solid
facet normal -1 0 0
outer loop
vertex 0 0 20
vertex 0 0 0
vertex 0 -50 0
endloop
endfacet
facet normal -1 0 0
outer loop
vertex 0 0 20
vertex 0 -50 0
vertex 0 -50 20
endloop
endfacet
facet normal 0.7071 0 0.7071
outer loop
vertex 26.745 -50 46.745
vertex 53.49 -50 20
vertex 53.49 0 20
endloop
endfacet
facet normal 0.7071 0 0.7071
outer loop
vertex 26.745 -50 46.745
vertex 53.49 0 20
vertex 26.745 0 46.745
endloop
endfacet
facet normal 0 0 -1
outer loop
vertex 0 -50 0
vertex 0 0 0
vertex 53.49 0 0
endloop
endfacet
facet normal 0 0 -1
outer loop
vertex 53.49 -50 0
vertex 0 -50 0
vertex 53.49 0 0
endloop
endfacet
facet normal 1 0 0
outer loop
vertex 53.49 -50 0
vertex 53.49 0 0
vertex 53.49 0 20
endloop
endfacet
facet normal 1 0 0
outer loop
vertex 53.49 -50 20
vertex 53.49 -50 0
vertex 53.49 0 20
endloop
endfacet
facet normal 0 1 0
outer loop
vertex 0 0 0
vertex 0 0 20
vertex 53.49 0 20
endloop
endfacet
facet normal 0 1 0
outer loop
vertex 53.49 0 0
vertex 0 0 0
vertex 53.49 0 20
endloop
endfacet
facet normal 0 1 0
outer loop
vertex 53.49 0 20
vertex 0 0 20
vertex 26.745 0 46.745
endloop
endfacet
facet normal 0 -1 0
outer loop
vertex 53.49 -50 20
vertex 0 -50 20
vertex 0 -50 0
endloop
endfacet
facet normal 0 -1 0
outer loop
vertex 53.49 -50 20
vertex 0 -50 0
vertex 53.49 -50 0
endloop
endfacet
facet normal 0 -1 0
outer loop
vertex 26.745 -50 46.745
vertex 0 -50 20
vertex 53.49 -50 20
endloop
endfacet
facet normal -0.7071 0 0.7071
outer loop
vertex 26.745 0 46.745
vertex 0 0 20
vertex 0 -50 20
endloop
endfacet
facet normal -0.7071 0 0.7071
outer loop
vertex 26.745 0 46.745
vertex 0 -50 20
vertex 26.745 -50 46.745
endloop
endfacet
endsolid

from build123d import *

# Parameters (mm, degrees)
F0_W        = 53.4896697645
F0_H        = 50
F1_DEPTH    = 50
F2_T1_DEPTH = 204.300979278


# Not quite as in the source:
# - a fillet or chamfer that OpenCascade refuses, or shapes differently, is made with other operations: its cross-section is extruded or revolved along the edge and cut away or added


with BuildPart() as f1:
    # F0 (on Front) → F1 (new body)
    with BuildSketch(Plane.XZ):
        with Locations((26.7448348823, 25)):
            Rectangle(F0_W, F0_H)
    extrude(amount=F1_DEPTH)

    # F2: chamfer of 30 on 2 edges, made by hand

    # F2_s2 → F2_t1 (cut)
    with BuildSketch(Plane.XZ.offset(-77.150489639)):
        Polygon((53.4896697645, 20), (23.4896697645, 50), (53.4896697645, 50), align=None)
        Polygon((0, 20), (30, 50), (0, 50), align=None)
    extrude(amount=F2_T1_DEPTH, mode=Mode.SUBTRACT)


solid = f1.part
